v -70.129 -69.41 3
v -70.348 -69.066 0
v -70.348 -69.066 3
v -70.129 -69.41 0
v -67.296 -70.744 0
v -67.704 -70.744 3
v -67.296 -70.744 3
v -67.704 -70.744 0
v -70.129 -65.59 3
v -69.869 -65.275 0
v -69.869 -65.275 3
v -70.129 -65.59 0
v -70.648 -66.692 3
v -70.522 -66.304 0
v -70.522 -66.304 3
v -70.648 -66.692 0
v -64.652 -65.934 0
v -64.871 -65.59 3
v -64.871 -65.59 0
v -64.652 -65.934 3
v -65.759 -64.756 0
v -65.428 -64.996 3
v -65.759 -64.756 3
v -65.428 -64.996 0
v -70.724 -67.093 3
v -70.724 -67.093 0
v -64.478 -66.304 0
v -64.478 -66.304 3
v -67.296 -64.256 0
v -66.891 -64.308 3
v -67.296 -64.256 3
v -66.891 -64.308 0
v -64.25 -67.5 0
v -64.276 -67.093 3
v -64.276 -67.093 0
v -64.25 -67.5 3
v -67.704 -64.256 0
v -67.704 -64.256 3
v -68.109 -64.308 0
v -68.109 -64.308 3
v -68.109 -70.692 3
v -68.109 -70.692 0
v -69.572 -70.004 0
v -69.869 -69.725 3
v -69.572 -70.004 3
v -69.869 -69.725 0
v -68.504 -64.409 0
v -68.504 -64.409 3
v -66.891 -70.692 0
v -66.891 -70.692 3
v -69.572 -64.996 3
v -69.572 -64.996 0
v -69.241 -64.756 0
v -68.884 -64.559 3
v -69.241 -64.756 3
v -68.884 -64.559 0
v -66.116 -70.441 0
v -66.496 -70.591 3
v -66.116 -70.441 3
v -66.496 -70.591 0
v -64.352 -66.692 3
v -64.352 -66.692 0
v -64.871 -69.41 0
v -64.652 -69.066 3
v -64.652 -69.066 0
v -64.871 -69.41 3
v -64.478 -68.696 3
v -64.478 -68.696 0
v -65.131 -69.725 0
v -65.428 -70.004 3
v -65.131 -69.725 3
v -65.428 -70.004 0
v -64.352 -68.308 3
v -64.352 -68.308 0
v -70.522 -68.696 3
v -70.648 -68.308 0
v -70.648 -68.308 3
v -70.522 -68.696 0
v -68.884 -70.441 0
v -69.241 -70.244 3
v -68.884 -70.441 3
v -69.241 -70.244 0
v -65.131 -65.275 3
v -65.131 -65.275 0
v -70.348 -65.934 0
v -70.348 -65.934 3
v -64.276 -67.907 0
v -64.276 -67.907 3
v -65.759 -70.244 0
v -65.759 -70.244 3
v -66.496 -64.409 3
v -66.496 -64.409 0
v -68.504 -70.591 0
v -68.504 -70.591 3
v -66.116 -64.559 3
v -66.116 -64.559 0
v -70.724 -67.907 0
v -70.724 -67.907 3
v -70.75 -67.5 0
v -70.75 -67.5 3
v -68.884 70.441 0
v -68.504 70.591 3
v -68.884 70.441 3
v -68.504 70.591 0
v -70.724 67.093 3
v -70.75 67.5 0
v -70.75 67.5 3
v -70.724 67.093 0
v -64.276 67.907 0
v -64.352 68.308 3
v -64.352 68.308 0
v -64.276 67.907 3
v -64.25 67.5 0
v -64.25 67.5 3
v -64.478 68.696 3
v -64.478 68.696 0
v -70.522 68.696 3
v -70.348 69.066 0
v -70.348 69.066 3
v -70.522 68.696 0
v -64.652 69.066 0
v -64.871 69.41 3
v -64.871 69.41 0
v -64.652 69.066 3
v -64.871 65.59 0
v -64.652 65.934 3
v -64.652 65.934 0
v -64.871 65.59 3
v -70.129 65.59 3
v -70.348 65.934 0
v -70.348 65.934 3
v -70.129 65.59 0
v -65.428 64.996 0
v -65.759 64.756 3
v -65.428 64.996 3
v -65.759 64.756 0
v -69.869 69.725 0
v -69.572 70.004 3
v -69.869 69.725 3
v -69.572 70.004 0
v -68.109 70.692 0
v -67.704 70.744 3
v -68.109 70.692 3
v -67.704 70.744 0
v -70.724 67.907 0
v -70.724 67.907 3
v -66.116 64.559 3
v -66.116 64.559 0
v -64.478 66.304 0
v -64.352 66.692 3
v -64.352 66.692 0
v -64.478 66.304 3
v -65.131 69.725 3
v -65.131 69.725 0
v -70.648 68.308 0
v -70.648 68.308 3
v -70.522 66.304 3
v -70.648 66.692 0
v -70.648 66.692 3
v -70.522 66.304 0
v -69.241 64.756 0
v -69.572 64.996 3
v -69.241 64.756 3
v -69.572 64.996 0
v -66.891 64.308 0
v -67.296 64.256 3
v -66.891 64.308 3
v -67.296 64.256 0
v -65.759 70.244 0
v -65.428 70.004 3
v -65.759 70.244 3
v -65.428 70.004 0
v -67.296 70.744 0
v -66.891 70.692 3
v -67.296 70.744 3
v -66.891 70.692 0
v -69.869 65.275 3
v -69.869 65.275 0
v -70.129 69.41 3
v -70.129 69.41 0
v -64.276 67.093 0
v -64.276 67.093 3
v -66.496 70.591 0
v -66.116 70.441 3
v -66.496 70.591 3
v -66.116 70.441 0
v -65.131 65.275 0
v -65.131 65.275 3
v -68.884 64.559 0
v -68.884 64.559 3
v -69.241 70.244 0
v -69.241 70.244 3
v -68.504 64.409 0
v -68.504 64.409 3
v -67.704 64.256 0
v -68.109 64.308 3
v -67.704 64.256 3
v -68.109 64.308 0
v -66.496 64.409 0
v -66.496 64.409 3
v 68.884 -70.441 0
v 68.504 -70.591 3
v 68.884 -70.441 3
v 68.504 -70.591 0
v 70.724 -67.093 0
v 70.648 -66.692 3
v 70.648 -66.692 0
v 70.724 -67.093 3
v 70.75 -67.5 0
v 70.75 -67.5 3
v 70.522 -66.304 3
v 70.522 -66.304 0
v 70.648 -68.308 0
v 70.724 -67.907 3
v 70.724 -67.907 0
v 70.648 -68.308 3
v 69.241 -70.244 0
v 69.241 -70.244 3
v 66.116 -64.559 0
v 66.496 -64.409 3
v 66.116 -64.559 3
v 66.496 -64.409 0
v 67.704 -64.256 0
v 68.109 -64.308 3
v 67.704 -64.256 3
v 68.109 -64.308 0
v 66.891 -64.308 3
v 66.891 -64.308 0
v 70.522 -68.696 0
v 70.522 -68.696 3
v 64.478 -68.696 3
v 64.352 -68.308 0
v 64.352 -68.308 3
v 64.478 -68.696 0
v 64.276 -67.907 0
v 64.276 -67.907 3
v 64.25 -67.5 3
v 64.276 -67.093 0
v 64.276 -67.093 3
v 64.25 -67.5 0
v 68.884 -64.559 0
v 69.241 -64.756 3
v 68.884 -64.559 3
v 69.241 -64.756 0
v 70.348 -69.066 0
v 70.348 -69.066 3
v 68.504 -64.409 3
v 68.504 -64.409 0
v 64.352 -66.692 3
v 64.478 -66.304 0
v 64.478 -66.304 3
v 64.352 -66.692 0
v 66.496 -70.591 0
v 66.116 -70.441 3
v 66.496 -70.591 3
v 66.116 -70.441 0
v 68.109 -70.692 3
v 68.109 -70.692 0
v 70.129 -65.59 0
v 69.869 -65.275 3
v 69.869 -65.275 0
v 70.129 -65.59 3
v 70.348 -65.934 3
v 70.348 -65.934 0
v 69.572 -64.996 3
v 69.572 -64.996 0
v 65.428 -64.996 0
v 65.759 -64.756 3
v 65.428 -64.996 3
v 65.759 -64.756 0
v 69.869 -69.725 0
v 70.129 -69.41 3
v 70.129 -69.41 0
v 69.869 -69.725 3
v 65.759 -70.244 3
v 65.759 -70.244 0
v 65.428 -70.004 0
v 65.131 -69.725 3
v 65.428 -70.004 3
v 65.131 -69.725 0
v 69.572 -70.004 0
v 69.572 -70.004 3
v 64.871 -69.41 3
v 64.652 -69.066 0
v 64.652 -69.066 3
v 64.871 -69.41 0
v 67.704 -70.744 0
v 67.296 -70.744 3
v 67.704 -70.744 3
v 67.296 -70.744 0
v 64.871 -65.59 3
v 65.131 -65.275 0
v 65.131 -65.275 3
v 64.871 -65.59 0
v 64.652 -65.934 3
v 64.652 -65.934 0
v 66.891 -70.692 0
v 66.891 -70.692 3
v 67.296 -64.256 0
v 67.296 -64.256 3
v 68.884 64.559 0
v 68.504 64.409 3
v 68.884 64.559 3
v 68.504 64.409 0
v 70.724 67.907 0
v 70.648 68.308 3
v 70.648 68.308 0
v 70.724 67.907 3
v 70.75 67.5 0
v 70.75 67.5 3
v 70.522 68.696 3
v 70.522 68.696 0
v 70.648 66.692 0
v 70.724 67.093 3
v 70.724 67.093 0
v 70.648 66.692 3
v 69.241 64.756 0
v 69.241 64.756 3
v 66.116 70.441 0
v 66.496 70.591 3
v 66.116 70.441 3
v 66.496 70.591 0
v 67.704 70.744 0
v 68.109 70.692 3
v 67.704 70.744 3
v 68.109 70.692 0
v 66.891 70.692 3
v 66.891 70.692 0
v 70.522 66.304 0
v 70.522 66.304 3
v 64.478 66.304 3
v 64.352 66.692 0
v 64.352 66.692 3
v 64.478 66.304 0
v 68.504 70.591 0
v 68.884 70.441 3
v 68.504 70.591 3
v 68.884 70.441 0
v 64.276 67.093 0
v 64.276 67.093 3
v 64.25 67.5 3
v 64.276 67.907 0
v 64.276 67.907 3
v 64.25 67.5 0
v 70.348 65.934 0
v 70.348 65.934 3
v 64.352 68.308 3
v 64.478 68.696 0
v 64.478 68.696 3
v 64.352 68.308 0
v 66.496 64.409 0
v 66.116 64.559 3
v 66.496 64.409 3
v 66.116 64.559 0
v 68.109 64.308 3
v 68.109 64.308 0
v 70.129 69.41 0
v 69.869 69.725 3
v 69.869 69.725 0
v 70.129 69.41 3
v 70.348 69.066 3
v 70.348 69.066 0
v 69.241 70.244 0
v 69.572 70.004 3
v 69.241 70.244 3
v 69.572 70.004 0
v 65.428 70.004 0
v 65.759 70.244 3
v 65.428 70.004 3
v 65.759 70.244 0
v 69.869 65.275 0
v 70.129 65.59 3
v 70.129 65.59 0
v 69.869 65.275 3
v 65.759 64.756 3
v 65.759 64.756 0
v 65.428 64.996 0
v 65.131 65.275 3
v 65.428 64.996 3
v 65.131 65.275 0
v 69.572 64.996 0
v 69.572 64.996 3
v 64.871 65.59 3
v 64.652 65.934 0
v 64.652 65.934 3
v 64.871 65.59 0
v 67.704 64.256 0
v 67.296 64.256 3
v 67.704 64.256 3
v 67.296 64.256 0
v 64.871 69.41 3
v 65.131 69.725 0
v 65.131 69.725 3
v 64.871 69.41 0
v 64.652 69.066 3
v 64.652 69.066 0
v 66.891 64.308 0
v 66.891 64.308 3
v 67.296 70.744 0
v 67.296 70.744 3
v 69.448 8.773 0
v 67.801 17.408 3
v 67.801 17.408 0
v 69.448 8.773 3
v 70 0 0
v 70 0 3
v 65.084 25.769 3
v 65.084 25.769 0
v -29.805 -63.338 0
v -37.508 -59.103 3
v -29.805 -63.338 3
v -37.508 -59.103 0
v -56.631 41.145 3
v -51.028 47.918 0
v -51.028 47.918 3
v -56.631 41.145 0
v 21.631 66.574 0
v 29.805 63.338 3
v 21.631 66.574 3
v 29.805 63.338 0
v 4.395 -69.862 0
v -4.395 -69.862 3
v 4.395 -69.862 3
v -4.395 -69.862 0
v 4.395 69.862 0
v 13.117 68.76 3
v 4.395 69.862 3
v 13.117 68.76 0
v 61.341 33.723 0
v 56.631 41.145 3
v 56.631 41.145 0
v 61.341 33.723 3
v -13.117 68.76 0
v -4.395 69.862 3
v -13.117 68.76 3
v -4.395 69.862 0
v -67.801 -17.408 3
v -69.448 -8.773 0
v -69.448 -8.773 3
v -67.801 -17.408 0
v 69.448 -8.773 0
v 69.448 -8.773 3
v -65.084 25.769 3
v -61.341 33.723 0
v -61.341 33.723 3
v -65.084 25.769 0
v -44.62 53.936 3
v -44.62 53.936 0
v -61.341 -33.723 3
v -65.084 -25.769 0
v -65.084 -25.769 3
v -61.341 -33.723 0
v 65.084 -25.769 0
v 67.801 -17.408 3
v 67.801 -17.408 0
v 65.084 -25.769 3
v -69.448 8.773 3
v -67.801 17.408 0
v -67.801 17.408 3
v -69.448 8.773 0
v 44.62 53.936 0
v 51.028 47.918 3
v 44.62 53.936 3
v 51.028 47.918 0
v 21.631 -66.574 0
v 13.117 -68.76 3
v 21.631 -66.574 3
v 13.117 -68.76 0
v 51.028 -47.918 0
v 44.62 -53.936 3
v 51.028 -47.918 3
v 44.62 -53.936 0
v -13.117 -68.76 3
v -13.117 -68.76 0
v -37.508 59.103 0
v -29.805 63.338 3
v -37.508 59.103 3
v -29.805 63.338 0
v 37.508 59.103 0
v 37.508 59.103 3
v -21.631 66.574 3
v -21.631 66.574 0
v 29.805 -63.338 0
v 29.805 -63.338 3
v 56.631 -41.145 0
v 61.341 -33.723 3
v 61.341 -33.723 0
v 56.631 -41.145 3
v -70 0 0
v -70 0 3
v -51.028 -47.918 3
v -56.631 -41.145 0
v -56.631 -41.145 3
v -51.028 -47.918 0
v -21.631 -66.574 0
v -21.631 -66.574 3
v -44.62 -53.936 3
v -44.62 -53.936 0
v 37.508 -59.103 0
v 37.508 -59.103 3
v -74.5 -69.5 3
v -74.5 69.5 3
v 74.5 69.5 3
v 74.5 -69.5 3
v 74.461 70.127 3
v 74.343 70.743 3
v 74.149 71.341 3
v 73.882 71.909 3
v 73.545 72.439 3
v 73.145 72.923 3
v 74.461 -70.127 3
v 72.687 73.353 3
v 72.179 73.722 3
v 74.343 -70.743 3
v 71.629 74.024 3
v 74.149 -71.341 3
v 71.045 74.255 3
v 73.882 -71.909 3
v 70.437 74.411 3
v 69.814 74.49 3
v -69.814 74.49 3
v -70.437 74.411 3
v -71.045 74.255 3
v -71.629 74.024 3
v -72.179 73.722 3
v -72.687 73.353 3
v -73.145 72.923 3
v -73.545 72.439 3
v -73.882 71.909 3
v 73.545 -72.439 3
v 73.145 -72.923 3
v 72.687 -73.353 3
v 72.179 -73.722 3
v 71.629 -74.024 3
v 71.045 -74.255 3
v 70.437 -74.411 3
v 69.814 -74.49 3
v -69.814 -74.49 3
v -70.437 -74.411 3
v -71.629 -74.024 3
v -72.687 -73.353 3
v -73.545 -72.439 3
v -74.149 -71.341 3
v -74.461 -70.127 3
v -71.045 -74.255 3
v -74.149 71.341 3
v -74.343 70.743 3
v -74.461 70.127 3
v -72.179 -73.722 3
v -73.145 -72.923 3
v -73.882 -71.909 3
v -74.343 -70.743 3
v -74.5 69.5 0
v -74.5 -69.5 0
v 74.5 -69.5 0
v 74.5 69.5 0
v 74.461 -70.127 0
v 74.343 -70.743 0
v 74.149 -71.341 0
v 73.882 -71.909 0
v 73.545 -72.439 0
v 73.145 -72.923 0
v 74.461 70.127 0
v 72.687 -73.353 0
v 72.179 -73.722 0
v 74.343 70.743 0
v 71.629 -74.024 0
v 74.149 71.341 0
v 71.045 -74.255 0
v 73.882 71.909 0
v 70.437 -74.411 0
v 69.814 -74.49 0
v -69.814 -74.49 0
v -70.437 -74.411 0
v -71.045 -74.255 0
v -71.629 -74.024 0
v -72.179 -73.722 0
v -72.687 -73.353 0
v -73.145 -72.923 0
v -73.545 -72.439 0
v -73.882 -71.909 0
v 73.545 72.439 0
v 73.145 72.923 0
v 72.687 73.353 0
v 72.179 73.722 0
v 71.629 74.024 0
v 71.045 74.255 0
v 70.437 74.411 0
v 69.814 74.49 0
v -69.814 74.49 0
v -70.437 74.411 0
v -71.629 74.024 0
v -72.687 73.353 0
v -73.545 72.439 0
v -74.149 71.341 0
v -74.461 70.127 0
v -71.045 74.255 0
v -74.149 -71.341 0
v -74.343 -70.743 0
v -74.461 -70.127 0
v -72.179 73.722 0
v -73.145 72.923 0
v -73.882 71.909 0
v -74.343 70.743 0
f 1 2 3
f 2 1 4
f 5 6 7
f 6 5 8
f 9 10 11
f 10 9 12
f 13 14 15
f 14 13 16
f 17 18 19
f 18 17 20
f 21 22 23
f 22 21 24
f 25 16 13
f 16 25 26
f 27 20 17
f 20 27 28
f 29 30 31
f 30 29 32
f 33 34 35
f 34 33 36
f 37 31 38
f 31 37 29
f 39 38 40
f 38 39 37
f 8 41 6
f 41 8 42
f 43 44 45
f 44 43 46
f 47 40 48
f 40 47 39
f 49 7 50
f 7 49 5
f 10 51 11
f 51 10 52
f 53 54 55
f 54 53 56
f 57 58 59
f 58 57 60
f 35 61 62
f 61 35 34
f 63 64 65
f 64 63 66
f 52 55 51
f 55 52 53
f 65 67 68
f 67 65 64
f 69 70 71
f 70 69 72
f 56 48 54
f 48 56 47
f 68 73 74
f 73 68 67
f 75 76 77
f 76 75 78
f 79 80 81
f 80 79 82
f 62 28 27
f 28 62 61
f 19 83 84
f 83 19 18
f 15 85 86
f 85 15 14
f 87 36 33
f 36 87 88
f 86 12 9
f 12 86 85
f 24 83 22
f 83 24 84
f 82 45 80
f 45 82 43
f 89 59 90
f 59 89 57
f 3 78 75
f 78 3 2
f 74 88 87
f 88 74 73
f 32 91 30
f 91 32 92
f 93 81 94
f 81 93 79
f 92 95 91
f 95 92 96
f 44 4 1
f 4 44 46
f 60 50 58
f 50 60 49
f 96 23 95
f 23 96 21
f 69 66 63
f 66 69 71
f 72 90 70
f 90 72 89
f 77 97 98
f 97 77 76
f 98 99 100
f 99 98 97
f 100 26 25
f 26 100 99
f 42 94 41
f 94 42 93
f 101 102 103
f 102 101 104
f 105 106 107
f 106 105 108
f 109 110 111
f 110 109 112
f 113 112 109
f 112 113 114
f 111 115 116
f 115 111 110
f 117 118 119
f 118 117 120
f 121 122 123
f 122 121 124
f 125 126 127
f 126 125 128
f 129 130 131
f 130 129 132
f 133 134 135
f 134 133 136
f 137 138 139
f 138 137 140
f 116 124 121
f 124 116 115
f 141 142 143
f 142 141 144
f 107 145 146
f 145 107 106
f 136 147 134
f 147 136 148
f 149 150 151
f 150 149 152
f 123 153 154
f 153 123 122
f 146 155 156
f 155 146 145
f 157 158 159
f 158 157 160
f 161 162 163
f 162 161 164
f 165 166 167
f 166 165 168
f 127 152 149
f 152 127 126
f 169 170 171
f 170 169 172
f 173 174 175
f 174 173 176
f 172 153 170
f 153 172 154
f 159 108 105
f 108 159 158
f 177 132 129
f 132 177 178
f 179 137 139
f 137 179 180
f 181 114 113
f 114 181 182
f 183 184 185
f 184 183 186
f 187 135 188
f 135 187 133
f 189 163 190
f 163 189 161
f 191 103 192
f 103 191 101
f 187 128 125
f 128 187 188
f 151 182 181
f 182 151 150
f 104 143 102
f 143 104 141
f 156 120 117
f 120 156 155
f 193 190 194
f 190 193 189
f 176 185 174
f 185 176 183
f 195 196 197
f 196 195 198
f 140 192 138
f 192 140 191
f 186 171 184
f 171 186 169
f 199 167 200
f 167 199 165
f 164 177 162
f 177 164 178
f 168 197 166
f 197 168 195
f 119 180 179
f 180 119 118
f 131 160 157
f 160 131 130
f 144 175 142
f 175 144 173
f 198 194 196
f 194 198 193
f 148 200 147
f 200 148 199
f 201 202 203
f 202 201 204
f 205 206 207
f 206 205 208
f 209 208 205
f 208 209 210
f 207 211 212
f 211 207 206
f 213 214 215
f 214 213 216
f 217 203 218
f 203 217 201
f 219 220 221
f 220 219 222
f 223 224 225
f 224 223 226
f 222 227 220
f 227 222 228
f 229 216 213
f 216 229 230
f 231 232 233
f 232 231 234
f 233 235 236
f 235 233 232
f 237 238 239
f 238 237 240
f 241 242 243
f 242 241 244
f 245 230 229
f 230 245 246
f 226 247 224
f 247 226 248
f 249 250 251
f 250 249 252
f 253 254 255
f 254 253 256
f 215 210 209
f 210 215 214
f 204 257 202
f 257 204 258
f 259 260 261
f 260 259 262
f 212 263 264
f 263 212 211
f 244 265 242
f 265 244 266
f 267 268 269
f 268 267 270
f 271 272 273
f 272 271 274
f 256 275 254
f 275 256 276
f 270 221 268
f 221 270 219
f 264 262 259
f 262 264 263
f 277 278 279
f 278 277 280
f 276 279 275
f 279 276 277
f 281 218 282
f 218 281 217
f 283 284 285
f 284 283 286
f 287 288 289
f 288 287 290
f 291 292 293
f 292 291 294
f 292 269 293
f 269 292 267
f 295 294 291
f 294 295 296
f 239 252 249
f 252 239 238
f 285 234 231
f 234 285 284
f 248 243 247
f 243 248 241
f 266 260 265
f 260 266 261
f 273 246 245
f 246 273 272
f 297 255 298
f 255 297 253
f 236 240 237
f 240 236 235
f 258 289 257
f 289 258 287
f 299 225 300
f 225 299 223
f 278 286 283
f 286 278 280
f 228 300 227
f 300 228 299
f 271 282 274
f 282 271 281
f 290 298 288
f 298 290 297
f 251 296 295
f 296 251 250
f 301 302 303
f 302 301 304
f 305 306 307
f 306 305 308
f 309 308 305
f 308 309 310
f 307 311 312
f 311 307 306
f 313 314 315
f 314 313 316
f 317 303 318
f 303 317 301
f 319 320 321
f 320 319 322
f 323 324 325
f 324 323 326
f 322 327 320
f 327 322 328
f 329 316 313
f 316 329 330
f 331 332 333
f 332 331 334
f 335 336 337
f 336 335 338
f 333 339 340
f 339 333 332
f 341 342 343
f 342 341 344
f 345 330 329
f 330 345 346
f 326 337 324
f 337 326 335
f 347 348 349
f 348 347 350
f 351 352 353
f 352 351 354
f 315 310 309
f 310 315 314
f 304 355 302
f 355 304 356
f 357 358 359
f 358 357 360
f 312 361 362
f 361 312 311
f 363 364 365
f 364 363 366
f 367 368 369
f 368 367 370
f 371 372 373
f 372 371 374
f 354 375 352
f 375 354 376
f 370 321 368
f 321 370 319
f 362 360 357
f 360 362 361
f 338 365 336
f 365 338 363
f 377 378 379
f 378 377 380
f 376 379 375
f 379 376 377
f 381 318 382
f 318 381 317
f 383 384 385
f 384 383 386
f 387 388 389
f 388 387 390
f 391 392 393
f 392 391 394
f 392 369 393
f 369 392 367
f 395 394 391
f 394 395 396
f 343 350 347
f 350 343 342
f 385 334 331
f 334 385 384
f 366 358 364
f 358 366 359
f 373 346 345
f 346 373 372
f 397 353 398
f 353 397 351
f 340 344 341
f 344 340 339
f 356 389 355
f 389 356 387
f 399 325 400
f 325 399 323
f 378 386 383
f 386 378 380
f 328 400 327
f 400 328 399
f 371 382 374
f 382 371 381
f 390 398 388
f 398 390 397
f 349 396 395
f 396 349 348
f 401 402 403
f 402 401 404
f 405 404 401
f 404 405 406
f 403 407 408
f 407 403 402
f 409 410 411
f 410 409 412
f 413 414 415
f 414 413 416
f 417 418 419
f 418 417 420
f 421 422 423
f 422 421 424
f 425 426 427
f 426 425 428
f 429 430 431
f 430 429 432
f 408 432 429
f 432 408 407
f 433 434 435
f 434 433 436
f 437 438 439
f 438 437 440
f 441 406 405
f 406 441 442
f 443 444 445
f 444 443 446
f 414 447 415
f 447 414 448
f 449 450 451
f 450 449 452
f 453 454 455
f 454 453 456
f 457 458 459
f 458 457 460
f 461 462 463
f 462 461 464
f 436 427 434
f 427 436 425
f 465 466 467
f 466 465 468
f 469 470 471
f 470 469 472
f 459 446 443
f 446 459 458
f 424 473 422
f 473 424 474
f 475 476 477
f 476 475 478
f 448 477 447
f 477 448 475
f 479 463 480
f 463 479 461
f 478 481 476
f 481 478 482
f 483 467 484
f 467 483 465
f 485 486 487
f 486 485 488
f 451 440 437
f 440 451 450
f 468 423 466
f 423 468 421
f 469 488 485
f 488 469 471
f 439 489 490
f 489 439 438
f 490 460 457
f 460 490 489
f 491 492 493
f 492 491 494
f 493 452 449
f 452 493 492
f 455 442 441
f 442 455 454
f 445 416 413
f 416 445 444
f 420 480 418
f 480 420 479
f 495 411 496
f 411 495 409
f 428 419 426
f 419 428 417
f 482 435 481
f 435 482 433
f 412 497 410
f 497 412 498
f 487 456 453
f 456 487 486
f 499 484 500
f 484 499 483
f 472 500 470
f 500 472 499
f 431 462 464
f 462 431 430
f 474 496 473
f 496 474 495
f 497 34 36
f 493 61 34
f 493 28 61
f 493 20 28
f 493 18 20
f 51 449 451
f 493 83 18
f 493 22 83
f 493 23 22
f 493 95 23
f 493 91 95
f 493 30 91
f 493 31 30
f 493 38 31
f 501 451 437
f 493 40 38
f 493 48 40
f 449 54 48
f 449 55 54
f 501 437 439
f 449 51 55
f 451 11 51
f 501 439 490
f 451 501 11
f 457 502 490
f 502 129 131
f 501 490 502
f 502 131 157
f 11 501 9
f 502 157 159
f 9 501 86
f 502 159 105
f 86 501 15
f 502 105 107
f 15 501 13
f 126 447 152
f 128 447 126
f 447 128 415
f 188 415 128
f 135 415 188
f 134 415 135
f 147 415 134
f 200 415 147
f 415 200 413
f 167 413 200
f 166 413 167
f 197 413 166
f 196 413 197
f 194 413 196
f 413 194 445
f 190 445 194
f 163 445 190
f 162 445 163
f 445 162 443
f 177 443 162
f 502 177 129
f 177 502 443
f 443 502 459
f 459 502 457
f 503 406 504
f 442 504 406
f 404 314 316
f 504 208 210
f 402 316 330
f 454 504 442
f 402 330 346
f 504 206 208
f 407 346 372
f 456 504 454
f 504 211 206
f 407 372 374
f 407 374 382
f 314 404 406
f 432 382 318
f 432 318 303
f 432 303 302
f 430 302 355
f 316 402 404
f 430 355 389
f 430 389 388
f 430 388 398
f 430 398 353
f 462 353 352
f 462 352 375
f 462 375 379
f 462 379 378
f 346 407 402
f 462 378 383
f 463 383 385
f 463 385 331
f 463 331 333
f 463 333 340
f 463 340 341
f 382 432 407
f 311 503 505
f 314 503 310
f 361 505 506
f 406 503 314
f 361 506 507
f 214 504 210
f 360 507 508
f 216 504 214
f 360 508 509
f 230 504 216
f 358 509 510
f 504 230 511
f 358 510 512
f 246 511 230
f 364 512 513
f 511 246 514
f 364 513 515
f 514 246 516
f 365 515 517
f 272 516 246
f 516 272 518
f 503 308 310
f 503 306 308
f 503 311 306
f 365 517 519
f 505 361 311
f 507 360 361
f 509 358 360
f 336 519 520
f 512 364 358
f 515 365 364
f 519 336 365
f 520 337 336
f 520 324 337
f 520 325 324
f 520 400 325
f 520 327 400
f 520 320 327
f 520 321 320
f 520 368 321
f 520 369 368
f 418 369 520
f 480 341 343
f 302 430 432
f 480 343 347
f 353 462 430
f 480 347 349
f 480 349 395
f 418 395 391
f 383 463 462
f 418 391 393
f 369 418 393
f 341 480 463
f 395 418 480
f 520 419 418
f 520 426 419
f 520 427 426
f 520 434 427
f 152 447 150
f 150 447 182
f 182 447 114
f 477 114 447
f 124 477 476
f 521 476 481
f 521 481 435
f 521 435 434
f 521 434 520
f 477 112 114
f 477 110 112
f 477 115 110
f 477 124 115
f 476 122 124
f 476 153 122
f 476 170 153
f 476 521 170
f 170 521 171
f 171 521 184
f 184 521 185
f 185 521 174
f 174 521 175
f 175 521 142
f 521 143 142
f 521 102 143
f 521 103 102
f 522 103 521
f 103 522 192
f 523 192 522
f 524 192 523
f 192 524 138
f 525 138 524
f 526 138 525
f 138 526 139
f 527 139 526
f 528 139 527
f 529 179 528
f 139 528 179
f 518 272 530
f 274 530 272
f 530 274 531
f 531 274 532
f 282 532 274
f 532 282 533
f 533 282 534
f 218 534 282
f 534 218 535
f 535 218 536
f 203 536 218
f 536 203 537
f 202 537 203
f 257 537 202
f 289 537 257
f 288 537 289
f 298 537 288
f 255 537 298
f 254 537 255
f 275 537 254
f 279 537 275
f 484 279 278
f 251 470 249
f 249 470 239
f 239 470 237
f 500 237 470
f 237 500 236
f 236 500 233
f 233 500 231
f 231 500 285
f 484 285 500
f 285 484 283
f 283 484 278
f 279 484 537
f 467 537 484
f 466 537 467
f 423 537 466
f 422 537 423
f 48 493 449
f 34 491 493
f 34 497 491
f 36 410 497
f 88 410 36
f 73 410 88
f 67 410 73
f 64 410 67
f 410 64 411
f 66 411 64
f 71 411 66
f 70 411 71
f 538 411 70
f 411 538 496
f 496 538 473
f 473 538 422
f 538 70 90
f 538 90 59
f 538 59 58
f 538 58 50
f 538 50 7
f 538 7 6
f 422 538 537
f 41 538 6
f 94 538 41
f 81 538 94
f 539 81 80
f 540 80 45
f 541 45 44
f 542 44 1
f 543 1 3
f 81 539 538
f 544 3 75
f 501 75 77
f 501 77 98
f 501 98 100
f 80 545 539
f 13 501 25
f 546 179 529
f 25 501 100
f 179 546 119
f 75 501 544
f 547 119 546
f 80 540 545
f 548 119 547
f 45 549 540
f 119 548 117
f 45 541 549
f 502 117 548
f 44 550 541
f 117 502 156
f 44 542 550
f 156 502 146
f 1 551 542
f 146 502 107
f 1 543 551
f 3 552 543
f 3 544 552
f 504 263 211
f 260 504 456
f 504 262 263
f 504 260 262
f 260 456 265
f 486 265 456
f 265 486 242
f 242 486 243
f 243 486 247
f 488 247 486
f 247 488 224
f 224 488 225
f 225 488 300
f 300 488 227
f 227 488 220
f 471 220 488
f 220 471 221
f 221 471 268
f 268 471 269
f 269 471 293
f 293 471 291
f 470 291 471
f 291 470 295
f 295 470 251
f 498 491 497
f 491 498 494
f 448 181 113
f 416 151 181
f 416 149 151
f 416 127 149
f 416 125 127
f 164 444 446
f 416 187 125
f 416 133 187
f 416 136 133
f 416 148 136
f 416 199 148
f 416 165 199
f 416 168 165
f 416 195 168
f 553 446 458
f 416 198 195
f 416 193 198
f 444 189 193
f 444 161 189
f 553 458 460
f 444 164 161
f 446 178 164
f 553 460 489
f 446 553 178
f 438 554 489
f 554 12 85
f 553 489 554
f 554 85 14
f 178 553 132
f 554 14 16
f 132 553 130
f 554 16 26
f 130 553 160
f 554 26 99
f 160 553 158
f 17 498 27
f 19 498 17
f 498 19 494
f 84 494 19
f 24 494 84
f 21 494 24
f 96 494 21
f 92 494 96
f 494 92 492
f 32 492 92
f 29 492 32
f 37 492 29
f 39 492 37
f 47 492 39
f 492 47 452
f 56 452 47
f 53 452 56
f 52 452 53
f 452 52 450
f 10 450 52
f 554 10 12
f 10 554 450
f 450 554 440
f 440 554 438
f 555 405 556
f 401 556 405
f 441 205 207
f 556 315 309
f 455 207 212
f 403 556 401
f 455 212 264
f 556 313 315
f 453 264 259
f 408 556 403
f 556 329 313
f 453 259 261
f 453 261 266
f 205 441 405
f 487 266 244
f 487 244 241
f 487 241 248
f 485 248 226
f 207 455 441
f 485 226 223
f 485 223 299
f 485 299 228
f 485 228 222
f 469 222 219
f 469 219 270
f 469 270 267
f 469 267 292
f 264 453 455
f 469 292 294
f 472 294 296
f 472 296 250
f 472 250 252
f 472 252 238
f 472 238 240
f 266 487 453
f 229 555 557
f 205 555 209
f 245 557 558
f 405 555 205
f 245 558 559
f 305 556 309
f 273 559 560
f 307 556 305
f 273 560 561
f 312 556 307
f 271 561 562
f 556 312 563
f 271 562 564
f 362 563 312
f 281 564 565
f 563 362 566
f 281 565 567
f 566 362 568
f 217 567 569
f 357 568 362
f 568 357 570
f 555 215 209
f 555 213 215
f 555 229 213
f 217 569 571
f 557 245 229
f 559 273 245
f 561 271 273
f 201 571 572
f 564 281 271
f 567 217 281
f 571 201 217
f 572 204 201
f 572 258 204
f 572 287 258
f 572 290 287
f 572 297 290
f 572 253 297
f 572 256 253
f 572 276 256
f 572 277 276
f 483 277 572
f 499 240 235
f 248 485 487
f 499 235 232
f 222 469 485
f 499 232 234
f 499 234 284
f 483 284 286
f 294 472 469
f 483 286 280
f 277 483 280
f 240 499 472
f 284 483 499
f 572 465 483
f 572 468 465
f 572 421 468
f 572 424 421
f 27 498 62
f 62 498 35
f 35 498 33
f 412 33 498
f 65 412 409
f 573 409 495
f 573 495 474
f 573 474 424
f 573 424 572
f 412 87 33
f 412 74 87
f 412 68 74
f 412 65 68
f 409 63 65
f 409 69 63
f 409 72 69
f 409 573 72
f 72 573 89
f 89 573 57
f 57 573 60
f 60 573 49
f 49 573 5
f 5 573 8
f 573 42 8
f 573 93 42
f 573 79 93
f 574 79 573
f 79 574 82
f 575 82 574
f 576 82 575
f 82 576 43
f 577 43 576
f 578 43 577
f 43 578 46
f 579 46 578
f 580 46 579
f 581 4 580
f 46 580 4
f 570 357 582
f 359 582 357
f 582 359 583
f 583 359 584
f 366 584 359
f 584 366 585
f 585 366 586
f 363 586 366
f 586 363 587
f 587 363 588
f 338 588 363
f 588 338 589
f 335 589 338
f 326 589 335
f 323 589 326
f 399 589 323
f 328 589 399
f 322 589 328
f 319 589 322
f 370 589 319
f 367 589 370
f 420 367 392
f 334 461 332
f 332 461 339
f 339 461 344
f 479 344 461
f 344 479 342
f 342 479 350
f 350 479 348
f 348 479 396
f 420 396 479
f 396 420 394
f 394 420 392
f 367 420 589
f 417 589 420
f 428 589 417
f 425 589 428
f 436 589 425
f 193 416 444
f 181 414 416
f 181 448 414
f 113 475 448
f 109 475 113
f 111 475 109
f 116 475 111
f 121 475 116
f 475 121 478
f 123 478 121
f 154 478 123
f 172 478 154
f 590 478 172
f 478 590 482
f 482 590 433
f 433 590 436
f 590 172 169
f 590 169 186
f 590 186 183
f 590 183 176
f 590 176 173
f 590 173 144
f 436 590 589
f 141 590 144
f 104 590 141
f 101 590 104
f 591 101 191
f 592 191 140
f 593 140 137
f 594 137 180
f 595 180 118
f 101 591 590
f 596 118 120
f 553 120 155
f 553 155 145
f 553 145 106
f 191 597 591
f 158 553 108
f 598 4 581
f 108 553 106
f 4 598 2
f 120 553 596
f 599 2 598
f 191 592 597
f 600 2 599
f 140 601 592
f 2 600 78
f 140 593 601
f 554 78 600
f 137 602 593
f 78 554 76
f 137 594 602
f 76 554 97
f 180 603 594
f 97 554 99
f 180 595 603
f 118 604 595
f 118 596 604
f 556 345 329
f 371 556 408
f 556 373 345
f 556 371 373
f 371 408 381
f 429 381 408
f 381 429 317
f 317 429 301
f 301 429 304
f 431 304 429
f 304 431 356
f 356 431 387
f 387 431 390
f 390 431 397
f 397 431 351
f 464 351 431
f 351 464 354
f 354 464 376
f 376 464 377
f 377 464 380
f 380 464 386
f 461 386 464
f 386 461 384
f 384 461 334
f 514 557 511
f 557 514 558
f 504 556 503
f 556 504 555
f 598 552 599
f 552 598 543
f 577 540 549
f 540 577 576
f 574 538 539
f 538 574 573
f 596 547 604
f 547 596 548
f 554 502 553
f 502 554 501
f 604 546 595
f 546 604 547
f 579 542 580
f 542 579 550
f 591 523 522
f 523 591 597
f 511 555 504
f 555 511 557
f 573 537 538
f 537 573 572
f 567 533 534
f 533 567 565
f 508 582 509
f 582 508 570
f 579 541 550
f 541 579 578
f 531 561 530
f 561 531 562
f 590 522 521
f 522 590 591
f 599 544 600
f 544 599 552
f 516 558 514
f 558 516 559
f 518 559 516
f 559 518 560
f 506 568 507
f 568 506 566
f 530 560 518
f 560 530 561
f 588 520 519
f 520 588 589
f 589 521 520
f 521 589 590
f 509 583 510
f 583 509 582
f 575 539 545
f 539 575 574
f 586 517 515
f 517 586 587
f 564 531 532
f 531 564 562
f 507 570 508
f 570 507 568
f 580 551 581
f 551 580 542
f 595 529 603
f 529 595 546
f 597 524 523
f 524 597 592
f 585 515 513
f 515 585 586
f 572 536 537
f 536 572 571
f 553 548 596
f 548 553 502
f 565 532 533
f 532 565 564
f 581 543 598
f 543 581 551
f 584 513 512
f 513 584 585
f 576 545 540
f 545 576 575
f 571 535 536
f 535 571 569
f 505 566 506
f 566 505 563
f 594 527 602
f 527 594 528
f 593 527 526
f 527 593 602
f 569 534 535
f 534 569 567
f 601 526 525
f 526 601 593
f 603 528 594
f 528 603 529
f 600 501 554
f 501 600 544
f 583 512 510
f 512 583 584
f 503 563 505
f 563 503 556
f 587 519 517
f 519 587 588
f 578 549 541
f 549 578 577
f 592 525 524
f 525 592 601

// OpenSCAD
$fn = 50;


difference() {
	union() {
		hull() {
			translate(v = [-69.5000000000, 69.5000000000, 0]) {
				cylinder(h = 3, r = 5);
			}
			translate(v = [69.5000000000, 69.5000000000, 0]) {
				cylinder(h = 3, r = 5);
			}
			translate(v = [-69.5000000000, -69.5000000000, 0]) {
				cylinder(h = 3, r = 5);
			}
			translate(v = [69.5000000000, -69.5000000000, 0]) {
				cylinder(h = 3, r = 5);
			}
		}
	}
	union() {
		#translate(v = [-67.5000000000, -67.5000000000, -100.0000000000]) {
			cylinder(h = 200, r = 3.2500000000);
		}
		#translate(v = [-67.5000000000, 67.5000000000, -100.0000000000]) {
			cylinder(h = 200, r = 3.2500000000);
		}
		#translate(v = [67.5000000000, -67.5000000000, -100.0000000000]) {
			cylinder(h = 200, r = 3.2500000000);
		}
		#translate(v = [67.5000000000, 67.5000000000, -100.0000000000]) {
			cylinder(h = 200, r = 3.2500000000);
		}
		#cylinder(h = 3, r = 70.0000000000);
	}
}
